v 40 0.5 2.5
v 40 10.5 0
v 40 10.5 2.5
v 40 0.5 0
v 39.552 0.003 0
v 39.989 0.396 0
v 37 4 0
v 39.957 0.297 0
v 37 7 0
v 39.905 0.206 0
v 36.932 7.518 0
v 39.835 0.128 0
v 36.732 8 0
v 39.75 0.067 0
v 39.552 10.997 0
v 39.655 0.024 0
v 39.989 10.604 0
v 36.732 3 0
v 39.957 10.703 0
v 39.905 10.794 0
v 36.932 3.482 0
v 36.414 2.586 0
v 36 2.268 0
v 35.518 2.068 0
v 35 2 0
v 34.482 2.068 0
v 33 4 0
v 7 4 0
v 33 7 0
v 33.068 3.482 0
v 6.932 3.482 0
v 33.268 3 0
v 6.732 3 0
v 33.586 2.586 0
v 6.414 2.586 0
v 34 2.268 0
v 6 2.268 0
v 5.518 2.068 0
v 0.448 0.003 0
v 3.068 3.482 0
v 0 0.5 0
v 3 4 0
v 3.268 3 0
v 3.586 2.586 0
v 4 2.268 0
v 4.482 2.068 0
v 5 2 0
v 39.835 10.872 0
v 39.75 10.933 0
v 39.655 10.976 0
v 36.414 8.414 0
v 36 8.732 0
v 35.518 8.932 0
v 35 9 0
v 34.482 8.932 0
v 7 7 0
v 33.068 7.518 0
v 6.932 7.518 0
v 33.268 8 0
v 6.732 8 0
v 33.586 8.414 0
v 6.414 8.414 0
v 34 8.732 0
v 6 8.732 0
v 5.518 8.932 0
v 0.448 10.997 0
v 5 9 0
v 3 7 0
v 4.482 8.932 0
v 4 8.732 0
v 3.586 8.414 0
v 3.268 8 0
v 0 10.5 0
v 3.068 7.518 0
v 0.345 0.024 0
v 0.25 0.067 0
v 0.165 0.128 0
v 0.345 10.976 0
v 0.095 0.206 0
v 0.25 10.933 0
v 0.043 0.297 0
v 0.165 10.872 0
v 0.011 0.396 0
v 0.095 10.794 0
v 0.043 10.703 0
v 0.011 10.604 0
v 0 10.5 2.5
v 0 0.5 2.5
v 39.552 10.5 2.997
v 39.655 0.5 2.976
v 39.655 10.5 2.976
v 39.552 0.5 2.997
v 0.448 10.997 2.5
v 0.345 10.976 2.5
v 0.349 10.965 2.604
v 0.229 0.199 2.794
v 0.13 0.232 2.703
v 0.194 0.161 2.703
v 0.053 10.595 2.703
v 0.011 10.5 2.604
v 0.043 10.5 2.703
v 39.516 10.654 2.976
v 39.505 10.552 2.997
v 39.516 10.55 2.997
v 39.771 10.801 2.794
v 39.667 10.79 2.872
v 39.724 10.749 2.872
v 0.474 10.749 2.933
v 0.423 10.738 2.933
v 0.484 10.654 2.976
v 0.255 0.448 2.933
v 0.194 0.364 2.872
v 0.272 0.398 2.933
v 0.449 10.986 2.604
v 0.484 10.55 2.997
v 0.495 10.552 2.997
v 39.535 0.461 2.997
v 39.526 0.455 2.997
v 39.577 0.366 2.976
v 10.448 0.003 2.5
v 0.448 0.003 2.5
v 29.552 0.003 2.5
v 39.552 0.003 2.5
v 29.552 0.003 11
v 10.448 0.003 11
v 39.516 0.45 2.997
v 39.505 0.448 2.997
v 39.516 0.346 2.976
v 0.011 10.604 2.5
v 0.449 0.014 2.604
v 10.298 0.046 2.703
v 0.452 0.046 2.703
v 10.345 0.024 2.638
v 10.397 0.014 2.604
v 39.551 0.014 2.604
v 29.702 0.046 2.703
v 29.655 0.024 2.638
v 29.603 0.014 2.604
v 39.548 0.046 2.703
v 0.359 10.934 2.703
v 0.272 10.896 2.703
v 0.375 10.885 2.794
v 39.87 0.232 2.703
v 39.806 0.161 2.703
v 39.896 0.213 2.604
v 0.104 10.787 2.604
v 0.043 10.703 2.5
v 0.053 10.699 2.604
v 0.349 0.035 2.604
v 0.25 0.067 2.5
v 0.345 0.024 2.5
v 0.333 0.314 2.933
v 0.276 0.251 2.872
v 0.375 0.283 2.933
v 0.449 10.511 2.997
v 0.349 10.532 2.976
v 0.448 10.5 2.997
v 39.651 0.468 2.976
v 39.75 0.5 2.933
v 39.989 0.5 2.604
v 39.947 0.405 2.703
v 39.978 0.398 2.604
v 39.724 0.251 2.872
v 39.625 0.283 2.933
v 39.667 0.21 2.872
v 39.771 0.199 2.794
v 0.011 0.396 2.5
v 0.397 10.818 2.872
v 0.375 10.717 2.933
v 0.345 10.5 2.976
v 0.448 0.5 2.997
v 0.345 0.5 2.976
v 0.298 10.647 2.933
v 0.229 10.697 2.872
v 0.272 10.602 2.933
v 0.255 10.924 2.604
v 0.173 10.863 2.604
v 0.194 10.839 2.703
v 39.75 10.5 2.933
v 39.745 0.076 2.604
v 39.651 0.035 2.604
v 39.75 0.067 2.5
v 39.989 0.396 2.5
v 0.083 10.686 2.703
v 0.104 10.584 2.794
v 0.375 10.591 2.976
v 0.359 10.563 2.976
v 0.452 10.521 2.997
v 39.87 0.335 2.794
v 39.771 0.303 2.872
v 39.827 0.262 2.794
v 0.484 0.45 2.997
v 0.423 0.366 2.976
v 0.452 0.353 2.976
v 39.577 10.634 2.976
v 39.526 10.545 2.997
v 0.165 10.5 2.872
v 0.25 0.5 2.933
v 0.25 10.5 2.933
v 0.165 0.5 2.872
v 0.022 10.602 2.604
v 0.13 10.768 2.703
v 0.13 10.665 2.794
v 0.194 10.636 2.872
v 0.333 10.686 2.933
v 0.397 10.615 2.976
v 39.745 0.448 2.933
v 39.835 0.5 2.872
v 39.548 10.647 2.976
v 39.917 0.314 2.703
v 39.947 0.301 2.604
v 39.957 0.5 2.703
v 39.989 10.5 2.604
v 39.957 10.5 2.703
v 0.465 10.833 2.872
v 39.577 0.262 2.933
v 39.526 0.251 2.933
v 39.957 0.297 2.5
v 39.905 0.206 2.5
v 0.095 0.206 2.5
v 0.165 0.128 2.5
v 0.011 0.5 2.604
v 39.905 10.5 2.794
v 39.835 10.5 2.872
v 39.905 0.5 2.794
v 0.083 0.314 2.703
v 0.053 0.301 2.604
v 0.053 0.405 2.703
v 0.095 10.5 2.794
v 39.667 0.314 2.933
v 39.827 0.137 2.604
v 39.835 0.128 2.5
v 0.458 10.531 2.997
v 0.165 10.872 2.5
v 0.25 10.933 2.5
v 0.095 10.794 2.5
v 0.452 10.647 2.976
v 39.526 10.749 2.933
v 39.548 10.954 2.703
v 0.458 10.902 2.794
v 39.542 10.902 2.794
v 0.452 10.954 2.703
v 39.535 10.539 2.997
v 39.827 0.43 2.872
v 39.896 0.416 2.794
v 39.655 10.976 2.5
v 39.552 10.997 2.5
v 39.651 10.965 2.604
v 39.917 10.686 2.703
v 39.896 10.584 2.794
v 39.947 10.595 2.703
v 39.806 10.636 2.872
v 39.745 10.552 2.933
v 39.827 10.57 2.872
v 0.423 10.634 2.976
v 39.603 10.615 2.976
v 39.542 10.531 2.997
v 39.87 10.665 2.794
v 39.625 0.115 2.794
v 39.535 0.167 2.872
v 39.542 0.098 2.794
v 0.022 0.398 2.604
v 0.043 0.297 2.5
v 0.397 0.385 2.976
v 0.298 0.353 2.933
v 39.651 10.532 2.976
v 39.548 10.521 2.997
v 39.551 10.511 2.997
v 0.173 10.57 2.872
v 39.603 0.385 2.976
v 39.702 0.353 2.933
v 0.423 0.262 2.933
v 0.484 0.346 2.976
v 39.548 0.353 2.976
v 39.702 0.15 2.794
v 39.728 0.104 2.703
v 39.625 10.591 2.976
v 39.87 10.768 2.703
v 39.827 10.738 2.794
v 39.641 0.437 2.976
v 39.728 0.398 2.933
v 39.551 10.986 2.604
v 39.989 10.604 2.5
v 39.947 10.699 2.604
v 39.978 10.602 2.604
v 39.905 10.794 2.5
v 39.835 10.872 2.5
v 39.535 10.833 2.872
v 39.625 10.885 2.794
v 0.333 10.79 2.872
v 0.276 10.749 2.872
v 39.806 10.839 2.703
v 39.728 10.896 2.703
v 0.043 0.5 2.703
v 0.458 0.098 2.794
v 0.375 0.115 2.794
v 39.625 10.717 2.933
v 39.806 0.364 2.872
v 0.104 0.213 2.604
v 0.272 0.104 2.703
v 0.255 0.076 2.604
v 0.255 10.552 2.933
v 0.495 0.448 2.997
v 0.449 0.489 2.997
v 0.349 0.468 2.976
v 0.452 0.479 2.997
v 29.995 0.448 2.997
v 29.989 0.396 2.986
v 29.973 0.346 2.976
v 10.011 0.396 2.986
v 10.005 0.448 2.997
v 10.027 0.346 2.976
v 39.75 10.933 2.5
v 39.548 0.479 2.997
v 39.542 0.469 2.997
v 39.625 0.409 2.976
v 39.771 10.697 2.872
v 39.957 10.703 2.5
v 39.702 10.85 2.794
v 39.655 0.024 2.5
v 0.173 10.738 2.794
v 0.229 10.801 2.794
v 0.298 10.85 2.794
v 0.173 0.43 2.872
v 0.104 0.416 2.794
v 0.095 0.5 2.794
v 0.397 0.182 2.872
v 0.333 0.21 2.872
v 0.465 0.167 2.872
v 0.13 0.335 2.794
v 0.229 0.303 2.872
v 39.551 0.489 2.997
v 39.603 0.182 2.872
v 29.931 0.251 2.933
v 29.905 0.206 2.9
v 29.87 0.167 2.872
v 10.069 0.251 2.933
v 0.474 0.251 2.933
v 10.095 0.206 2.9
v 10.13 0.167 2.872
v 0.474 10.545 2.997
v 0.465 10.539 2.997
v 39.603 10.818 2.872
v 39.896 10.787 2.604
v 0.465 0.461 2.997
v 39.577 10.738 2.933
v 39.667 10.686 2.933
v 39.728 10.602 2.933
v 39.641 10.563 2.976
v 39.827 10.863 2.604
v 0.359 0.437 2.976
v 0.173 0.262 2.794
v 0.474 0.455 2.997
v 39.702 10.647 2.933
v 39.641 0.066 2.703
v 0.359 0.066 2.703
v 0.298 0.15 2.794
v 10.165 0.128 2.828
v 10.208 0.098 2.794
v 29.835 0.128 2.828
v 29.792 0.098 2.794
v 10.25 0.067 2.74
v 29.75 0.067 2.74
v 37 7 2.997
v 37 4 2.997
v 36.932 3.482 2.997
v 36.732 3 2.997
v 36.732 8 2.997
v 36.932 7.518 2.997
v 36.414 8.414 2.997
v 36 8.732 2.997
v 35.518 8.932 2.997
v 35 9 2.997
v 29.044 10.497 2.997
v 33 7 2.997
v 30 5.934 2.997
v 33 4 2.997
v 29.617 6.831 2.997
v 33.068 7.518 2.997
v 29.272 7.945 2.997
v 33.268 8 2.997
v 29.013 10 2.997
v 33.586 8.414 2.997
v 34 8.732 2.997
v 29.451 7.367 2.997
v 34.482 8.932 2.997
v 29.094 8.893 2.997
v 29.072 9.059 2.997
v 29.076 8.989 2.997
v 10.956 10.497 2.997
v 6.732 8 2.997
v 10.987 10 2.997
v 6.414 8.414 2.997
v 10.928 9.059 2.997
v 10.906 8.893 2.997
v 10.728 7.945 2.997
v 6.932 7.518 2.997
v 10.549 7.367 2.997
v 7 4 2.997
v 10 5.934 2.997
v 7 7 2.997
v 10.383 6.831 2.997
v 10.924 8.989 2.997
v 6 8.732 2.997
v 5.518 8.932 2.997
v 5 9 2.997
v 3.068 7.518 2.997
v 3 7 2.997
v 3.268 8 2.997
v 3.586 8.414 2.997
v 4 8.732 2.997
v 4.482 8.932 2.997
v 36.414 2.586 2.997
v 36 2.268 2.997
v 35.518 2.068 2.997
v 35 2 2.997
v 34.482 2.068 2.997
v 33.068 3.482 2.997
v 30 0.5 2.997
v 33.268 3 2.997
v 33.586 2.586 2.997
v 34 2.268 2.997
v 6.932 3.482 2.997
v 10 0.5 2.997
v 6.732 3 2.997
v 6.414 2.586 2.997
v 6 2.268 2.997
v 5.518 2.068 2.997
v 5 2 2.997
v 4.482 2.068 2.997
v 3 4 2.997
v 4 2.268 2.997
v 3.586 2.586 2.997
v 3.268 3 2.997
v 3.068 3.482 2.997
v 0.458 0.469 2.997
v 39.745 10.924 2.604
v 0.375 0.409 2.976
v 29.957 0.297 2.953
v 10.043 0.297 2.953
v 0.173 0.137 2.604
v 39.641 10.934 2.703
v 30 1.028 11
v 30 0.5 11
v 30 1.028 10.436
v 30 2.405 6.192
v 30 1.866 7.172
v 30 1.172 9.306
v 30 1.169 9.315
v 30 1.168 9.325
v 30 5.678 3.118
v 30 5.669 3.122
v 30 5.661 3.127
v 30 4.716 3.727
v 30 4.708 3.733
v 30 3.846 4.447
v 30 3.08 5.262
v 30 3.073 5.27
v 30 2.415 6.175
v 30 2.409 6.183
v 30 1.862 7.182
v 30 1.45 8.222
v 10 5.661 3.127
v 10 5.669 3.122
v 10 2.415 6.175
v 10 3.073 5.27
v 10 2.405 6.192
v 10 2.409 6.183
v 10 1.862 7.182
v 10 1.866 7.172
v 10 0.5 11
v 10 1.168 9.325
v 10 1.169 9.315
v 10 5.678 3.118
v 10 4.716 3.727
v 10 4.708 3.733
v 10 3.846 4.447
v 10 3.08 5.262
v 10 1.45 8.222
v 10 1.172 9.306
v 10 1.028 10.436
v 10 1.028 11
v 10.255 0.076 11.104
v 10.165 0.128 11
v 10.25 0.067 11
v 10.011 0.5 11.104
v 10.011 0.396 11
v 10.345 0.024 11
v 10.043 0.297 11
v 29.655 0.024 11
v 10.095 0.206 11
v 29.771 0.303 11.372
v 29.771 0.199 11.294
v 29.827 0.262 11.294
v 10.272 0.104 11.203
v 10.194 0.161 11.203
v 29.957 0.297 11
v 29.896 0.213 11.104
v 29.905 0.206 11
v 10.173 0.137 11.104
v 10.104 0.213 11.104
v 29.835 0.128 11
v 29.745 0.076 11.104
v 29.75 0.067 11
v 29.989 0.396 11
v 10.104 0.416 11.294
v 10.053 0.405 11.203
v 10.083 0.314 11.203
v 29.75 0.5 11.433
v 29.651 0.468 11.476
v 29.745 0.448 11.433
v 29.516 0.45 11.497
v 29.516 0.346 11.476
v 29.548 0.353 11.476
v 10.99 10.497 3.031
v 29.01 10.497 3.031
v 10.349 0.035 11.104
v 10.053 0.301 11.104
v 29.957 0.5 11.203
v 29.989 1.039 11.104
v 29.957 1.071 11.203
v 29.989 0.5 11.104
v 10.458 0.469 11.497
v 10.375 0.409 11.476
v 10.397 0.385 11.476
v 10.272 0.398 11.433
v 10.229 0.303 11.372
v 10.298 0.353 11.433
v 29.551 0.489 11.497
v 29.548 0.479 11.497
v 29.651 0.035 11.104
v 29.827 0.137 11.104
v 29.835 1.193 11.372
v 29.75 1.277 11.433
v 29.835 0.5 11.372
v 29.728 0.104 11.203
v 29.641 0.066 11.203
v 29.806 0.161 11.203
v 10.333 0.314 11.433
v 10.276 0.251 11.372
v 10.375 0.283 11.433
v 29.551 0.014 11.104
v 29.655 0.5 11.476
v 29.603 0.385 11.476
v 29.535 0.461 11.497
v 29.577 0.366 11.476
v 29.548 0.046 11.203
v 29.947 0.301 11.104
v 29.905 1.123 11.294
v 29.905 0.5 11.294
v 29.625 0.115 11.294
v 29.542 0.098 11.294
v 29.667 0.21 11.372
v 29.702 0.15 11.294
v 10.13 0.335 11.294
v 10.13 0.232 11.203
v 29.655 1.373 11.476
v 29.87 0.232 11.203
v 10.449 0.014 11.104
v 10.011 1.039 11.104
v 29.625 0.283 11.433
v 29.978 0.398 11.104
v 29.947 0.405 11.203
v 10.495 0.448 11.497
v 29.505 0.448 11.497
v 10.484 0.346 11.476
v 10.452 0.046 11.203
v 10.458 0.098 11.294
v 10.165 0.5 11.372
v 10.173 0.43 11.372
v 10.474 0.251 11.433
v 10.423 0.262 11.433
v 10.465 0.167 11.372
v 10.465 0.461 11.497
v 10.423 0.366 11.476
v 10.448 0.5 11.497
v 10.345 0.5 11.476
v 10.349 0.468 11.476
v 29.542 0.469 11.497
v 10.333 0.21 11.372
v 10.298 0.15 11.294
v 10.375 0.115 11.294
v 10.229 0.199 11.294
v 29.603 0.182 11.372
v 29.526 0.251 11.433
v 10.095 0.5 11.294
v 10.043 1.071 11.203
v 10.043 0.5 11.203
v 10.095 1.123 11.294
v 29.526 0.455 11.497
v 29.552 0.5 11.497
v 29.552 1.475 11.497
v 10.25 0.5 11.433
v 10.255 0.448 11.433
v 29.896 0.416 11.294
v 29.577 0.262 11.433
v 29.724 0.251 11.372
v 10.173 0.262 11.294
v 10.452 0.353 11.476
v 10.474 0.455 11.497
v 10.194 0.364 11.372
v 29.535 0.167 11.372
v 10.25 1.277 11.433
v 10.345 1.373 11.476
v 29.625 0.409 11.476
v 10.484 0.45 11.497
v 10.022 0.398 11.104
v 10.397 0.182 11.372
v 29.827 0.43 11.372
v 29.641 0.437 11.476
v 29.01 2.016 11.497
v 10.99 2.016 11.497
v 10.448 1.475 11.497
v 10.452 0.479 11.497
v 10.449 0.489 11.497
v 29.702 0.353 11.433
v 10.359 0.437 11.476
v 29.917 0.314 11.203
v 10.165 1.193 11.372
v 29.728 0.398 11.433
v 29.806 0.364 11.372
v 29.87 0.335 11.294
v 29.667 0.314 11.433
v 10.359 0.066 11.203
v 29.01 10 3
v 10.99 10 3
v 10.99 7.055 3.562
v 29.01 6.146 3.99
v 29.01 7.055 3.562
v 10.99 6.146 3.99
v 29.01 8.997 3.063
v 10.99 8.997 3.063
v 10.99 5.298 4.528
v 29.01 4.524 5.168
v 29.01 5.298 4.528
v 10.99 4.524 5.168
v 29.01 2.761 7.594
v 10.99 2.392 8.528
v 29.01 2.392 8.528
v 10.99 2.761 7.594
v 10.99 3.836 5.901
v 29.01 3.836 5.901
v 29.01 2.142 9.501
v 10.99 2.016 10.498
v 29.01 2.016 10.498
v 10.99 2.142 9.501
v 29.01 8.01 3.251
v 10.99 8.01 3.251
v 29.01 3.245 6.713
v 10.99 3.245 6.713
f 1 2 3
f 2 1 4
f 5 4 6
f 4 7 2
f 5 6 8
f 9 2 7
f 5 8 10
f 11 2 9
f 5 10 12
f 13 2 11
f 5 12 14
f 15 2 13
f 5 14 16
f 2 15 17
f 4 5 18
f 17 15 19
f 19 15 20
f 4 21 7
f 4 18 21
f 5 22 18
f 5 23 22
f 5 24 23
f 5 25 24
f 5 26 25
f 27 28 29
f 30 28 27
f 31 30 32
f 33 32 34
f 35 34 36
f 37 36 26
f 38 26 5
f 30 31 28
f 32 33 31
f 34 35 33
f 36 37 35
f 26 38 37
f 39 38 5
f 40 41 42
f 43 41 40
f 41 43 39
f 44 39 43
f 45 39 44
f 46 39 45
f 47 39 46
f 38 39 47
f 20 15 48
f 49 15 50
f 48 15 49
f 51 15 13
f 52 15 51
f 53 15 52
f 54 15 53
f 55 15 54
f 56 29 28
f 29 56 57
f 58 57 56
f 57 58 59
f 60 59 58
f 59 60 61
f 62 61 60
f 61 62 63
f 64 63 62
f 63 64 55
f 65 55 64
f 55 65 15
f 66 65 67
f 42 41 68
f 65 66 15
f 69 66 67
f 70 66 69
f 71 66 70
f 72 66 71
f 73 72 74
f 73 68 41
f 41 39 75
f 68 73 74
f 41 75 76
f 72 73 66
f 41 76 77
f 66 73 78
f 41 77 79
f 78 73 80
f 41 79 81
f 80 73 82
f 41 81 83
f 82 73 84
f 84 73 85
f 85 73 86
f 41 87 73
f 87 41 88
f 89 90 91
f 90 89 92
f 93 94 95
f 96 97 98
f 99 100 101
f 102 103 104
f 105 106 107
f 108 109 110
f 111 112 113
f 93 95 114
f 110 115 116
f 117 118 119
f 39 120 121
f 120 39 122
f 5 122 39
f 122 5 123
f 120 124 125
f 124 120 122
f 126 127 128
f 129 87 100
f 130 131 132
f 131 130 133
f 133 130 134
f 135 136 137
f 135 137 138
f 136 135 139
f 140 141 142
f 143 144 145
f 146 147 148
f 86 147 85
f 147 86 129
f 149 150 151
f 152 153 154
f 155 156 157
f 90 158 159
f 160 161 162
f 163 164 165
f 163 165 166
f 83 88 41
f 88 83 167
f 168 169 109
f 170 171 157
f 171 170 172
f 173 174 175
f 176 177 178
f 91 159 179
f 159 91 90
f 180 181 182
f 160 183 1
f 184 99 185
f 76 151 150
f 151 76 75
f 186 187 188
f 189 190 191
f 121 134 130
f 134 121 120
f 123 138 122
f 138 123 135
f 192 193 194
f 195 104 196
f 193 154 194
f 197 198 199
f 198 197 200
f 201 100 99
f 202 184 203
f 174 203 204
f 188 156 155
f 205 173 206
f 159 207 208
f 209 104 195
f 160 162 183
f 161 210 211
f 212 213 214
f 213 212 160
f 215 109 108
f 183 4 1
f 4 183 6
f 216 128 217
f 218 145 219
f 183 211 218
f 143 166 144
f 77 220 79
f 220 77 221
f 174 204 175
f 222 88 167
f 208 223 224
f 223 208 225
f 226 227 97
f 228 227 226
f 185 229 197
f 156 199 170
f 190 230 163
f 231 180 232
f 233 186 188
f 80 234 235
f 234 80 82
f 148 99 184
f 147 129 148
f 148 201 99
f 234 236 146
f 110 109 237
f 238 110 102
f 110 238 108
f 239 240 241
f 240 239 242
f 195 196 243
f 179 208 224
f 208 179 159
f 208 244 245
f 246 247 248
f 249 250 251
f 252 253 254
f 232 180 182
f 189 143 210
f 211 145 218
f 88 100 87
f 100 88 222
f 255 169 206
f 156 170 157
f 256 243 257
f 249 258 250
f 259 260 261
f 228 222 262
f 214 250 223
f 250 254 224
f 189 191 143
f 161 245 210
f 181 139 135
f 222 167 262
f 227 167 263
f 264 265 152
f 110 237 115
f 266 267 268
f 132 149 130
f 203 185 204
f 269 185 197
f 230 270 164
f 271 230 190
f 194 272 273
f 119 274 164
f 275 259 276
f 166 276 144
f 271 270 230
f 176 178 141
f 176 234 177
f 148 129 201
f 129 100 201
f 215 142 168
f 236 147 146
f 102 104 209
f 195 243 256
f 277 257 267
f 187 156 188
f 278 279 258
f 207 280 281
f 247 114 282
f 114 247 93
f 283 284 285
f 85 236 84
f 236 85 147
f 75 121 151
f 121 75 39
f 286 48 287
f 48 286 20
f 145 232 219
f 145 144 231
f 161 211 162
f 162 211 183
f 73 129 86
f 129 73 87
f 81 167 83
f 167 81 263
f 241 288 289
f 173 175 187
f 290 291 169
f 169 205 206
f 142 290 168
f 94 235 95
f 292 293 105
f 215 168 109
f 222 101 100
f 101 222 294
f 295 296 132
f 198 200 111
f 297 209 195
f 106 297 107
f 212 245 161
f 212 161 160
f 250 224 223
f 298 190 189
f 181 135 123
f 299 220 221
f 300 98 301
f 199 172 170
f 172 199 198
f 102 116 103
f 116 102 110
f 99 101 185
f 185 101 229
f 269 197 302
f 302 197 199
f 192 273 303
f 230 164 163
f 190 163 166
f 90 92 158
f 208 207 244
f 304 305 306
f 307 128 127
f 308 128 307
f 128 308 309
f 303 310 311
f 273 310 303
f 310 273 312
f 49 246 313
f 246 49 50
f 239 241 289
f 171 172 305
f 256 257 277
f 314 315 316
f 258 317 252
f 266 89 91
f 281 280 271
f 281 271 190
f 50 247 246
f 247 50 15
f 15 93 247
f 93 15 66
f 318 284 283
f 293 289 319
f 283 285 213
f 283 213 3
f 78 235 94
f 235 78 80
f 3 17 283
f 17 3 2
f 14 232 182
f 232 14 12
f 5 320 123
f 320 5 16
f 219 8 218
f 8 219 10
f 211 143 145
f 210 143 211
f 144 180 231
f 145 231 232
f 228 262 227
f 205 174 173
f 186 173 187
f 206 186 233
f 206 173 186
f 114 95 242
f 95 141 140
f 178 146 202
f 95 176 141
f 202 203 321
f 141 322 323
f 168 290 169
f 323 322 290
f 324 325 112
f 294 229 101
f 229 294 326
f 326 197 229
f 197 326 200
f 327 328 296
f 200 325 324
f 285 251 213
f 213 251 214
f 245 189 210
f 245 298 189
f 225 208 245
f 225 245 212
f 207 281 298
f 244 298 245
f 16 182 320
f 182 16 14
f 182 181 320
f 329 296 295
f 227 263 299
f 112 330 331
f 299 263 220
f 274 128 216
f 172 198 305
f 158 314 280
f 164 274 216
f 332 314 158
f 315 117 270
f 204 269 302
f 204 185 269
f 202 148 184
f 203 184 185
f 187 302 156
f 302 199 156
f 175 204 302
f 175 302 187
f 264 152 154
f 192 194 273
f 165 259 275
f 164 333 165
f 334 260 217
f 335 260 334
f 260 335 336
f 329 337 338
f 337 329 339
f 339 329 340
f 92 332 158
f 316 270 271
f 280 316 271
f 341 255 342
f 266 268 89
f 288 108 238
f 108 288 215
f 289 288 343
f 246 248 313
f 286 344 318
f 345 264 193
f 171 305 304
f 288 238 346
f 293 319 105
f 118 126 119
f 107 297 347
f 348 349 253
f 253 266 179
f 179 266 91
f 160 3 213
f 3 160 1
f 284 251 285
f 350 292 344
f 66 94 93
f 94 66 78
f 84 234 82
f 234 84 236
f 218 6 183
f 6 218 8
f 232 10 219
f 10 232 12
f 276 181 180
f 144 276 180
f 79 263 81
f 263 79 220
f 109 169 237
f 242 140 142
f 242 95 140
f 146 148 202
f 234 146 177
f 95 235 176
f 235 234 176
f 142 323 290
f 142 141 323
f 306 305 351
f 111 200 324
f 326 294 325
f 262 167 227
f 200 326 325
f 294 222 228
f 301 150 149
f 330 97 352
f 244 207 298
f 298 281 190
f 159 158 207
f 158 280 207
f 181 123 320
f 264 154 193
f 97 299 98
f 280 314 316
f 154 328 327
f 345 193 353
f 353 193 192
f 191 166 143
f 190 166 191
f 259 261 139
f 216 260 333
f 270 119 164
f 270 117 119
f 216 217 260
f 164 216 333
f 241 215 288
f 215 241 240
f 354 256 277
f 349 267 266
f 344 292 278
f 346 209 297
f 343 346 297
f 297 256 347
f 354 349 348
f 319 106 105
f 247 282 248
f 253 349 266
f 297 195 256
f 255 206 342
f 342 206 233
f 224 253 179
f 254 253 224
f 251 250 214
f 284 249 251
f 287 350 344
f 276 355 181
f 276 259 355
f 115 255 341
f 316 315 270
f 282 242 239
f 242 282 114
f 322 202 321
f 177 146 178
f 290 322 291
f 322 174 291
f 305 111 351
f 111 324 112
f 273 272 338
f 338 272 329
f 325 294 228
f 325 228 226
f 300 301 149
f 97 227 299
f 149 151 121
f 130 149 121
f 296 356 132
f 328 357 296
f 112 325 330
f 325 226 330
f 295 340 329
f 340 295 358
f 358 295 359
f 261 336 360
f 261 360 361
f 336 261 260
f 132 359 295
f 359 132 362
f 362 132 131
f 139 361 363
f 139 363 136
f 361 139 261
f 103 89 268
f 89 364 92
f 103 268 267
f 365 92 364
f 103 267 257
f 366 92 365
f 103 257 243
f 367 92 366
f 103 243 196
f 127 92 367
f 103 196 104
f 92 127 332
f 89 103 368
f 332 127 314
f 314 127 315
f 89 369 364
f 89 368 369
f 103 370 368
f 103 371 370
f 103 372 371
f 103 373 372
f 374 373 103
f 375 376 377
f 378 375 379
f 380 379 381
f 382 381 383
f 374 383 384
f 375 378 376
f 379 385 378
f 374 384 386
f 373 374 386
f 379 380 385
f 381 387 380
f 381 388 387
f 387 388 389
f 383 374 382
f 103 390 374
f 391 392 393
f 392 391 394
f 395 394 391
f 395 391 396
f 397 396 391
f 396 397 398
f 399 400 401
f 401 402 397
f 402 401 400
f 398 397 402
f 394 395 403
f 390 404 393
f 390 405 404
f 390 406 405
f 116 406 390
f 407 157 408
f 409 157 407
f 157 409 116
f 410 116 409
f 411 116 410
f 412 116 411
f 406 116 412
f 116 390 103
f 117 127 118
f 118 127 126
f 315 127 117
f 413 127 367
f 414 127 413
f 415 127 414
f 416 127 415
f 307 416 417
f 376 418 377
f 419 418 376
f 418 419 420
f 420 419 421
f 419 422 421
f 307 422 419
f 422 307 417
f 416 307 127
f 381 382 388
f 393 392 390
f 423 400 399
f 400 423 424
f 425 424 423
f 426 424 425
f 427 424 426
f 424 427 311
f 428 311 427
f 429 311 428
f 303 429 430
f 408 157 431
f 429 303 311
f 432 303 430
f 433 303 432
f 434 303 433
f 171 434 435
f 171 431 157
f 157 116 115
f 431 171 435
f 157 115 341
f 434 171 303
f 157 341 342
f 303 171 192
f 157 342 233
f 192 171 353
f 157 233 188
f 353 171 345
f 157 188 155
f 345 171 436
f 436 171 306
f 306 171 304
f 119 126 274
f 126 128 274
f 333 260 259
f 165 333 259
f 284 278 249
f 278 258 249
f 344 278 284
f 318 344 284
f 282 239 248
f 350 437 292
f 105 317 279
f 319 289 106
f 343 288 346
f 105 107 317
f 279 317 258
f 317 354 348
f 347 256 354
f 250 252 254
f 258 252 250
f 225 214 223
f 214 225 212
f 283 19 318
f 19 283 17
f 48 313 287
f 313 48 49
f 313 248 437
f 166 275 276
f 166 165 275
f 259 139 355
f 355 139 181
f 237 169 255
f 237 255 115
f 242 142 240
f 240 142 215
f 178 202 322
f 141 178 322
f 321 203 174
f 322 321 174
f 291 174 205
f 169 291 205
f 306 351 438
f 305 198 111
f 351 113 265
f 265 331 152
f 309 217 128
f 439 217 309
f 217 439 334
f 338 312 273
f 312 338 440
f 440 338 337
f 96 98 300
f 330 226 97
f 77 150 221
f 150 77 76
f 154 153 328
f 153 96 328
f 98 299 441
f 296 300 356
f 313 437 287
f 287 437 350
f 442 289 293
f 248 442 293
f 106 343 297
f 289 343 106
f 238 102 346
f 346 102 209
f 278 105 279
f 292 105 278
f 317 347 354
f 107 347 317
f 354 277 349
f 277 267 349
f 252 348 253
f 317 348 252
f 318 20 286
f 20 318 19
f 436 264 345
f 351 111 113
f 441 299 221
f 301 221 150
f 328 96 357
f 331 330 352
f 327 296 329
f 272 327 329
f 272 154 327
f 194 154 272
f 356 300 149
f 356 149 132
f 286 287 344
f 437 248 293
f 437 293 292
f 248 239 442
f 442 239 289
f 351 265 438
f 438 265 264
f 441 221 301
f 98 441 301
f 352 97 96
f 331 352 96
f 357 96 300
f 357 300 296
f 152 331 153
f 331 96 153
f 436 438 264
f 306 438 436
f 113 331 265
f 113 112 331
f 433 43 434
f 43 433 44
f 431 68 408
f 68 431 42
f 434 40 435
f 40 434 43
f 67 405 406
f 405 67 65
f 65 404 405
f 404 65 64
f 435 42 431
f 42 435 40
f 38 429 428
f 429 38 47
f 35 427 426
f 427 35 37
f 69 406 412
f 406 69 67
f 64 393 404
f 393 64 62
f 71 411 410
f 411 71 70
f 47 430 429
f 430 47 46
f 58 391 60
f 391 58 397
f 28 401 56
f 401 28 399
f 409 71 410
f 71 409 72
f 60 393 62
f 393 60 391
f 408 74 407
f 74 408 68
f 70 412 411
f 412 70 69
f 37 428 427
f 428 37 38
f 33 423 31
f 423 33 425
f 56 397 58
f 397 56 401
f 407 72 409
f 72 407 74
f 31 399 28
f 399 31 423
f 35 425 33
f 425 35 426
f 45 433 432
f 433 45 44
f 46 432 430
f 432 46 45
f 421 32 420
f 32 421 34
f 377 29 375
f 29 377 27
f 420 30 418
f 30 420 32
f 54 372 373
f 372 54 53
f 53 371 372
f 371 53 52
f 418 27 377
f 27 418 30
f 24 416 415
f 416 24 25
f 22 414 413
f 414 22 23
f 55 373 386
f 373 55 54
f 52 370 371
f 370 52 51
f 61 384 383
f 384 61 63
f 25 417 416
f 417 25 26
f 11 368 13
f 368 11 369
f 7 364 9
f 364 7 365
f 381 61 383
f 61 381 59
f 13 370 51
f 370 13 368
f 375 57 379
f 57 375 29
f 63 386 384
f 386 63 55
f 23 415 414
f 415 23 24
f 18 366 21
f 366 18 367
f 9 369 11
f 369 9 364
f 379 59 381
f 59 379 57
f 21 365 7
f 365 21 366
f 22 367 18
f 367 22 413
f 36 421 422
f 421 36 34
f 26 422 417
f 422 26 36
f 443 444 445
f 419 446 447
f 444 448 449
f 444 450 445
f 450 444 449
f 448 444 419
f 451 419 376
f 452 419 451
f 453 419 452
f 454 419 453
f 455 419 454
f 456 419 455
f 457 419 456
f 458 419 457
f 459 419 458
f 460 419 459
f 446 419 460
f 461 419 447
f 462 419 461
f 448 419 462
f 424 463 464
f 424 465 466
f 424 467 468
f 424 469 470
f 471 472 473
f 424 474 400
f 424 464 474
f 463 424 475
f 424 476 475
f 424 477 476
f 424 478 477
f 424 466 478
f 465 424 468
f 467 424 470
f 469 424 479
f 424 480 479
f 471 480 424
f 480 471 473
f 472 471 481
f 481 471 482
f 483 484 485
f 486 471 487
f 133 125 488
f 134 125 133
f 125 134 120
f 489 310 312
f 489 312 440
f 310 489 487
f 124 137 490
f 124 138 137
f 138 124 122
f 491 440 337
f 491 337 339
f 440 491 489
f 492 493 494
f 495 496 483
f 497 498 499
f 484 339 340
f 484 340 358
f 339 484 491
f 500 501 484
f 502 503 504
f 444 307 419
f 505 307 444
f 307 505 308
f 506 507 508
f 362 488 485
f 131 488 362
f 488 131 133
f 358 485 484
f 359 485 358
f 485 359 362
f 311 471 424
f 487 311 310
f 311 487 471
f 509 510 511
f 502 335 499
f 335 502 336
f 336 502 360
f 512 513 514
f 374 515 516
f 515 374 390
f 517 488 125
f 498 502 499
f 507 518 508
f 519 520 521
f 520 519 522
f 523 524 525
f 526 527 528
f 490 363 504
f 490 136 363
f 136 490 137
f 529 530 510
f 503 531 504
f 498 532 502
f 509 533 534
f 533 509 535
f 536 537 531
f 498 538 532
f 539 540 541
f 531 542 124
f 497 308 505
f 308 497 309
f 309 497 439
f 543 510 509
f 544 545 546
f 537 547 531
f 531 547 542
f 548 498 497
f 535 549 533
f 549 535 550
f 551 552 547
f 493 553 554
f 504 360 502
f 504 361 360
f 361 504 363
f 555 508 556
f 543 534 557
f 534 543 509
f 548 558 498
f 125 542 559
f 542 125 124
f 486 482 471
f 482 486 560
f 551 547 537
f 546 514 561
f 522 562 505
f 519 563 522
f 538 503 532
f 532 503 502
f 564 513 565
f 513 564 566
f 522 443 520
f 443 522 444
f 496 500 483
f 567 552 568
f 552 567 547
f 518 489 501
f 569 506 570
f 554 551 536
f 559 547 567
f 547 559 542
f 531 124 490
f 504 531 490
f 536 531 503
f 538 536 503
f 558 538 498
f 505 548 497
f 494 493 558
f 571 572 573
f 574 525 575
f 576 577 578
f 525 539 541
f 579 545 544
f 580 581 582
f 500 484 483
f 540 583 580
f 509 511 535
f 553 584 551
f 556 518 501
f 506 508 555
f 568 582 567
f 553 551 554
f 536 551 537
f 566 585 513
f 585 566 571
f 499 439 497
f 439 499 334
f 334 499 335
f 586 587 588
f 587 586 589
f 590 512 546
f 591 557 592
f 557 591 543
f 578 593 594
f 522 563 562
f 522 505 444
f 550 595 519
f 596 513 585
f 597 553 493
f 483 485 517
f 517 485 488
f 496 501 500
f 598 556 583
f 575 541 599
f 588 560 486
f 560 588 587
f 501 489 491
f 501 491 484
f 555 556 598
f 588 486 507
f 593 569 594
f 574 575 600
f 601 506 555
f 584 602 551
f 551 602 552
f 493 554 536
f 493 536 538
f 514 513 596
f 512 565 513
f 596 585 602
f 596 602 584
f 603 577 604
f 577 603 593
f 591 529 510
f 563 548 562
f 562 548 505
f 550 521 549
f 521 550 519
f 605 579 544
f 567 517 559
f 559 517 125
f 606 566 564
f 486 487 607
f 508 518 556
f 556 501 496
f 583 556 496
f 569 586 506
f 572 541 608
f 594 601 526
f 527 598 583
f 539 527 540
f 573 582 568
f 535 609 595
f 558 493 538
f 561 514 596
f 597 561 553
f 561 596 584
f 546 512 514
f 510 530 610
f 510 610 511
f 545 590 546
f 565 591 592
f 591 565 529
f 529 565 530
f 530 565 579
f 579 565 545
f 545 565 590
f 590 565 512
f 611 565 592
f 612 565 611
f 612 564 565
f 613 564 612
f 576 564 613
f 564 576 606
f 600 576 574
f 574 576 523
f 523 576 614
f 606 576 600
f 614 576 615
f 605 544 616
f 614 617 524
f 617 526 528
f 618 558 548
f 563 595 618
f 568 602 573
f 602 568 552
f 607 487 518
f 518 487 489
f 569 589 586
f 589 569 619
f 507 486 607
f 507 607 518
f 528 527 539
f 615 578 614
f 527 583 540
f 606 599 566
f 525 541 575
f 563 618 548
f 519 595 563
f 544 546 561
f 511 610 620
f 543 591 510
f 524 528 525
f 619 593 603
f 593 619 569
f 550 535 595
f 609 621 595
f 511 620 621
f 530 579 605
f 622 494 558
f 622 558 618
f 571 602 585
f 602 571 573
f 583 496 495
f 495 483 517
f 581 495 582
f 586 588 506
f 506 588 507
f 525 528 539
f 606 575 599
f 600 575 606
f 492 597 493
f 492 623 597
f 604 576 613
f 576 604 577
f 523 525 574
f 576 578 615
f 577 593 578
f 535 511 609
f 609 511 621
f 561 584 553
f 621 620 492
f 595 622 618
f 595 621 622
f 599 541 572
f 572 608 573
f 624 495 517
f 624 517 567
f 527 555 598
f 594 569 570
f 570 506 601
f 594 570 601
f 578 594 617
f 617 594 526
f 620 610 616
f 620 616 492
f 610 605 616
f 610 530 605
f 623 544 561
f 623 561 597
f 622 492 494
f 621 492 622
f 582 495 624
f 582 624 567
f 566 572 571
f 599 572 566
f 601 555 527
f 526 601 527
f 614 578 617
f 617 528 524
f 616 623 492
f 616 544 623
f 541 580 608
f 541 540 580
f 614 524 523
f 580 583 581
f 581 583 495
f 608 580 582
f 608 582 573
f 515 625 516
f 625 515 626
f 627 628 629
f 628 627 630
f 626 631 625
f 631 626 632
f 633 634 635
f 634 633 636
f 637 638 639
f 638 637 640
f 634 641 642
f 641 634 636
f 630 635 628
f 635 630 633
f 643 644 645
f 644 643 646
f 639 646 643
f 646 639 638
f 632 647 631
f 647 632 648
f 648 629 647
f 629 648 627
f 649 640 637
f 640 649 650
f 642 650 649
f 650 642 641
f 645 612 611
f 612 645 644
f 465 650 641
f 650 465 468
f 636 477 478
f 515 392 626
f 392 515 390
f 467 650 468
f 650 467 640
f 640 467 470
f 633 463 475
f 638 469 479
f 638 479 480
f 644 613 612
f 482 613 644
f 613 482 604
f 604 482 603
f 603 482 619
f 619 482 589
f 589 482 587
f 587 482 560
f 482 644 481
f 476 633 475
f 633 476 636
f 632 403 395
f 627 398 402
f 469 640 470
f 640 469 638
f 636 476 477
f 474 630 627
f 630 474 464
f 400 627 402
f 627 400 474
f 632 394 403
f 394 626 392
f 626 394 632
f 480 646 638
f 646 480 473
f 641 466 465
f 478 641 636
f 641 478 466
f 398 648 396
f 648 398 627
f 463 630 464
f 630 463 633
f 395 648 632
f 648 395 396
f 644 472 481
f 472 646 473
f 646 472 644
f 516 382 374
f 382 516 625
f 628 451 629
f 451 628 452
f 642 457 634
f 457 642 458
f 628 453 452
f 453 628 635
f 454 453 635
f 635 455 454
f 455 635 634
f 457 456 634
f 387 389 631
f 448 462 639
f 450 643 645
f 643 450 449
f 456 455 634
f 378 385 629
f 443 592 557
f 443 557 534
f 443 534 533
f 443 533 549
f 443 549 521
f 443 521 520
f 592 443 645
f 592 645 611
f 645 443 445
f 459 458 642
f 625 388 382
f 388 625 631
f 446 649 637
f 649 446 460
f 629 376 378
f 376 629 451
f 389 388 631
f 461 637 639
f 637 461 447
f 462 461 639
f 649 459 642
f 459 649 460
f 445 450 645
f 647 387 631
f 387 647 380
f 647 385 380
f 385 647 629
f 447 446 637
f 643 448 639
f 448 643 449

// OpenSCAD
difference(){
  cube2([40,11,3]);
  for(x=[5,35]) translate([x,4,-.01]) linear_extrude(3.02) {
    circle(d=4,$fn=24);
    translate([-2,0]) square([4,3]);
    translate([0,3]) circle(d=4,$fn=24);
  }
}
translate([10,0,2.5]) difference() {
  cube2([20,10.5,9]);
  translate([-.01,10,8.5]) rotate([0,90]) {
    cylinder(d=16,h=20.02,$fn=50);
    cylinder(d1=18,d2=16,h=1,$fn=50);
    translate([0,0,19.02]) cylinder(d1=16,d2=18,h=1,$fn=50);
  }
}

module cube2(dims,r=0.5,bottom=0,top=1) {
  intersection(){
    cube([dims[0],dims[1],dims[2]]);
    minkowski() {
    translate([r,r,bottom?r:0])
      cube([dims[0]-r*2,dims[1]-r*2,dims[2]-(bottom?r:0)-(top?r:0)]);
      sphere(r=r,$fn=30);
    }
  }
}
